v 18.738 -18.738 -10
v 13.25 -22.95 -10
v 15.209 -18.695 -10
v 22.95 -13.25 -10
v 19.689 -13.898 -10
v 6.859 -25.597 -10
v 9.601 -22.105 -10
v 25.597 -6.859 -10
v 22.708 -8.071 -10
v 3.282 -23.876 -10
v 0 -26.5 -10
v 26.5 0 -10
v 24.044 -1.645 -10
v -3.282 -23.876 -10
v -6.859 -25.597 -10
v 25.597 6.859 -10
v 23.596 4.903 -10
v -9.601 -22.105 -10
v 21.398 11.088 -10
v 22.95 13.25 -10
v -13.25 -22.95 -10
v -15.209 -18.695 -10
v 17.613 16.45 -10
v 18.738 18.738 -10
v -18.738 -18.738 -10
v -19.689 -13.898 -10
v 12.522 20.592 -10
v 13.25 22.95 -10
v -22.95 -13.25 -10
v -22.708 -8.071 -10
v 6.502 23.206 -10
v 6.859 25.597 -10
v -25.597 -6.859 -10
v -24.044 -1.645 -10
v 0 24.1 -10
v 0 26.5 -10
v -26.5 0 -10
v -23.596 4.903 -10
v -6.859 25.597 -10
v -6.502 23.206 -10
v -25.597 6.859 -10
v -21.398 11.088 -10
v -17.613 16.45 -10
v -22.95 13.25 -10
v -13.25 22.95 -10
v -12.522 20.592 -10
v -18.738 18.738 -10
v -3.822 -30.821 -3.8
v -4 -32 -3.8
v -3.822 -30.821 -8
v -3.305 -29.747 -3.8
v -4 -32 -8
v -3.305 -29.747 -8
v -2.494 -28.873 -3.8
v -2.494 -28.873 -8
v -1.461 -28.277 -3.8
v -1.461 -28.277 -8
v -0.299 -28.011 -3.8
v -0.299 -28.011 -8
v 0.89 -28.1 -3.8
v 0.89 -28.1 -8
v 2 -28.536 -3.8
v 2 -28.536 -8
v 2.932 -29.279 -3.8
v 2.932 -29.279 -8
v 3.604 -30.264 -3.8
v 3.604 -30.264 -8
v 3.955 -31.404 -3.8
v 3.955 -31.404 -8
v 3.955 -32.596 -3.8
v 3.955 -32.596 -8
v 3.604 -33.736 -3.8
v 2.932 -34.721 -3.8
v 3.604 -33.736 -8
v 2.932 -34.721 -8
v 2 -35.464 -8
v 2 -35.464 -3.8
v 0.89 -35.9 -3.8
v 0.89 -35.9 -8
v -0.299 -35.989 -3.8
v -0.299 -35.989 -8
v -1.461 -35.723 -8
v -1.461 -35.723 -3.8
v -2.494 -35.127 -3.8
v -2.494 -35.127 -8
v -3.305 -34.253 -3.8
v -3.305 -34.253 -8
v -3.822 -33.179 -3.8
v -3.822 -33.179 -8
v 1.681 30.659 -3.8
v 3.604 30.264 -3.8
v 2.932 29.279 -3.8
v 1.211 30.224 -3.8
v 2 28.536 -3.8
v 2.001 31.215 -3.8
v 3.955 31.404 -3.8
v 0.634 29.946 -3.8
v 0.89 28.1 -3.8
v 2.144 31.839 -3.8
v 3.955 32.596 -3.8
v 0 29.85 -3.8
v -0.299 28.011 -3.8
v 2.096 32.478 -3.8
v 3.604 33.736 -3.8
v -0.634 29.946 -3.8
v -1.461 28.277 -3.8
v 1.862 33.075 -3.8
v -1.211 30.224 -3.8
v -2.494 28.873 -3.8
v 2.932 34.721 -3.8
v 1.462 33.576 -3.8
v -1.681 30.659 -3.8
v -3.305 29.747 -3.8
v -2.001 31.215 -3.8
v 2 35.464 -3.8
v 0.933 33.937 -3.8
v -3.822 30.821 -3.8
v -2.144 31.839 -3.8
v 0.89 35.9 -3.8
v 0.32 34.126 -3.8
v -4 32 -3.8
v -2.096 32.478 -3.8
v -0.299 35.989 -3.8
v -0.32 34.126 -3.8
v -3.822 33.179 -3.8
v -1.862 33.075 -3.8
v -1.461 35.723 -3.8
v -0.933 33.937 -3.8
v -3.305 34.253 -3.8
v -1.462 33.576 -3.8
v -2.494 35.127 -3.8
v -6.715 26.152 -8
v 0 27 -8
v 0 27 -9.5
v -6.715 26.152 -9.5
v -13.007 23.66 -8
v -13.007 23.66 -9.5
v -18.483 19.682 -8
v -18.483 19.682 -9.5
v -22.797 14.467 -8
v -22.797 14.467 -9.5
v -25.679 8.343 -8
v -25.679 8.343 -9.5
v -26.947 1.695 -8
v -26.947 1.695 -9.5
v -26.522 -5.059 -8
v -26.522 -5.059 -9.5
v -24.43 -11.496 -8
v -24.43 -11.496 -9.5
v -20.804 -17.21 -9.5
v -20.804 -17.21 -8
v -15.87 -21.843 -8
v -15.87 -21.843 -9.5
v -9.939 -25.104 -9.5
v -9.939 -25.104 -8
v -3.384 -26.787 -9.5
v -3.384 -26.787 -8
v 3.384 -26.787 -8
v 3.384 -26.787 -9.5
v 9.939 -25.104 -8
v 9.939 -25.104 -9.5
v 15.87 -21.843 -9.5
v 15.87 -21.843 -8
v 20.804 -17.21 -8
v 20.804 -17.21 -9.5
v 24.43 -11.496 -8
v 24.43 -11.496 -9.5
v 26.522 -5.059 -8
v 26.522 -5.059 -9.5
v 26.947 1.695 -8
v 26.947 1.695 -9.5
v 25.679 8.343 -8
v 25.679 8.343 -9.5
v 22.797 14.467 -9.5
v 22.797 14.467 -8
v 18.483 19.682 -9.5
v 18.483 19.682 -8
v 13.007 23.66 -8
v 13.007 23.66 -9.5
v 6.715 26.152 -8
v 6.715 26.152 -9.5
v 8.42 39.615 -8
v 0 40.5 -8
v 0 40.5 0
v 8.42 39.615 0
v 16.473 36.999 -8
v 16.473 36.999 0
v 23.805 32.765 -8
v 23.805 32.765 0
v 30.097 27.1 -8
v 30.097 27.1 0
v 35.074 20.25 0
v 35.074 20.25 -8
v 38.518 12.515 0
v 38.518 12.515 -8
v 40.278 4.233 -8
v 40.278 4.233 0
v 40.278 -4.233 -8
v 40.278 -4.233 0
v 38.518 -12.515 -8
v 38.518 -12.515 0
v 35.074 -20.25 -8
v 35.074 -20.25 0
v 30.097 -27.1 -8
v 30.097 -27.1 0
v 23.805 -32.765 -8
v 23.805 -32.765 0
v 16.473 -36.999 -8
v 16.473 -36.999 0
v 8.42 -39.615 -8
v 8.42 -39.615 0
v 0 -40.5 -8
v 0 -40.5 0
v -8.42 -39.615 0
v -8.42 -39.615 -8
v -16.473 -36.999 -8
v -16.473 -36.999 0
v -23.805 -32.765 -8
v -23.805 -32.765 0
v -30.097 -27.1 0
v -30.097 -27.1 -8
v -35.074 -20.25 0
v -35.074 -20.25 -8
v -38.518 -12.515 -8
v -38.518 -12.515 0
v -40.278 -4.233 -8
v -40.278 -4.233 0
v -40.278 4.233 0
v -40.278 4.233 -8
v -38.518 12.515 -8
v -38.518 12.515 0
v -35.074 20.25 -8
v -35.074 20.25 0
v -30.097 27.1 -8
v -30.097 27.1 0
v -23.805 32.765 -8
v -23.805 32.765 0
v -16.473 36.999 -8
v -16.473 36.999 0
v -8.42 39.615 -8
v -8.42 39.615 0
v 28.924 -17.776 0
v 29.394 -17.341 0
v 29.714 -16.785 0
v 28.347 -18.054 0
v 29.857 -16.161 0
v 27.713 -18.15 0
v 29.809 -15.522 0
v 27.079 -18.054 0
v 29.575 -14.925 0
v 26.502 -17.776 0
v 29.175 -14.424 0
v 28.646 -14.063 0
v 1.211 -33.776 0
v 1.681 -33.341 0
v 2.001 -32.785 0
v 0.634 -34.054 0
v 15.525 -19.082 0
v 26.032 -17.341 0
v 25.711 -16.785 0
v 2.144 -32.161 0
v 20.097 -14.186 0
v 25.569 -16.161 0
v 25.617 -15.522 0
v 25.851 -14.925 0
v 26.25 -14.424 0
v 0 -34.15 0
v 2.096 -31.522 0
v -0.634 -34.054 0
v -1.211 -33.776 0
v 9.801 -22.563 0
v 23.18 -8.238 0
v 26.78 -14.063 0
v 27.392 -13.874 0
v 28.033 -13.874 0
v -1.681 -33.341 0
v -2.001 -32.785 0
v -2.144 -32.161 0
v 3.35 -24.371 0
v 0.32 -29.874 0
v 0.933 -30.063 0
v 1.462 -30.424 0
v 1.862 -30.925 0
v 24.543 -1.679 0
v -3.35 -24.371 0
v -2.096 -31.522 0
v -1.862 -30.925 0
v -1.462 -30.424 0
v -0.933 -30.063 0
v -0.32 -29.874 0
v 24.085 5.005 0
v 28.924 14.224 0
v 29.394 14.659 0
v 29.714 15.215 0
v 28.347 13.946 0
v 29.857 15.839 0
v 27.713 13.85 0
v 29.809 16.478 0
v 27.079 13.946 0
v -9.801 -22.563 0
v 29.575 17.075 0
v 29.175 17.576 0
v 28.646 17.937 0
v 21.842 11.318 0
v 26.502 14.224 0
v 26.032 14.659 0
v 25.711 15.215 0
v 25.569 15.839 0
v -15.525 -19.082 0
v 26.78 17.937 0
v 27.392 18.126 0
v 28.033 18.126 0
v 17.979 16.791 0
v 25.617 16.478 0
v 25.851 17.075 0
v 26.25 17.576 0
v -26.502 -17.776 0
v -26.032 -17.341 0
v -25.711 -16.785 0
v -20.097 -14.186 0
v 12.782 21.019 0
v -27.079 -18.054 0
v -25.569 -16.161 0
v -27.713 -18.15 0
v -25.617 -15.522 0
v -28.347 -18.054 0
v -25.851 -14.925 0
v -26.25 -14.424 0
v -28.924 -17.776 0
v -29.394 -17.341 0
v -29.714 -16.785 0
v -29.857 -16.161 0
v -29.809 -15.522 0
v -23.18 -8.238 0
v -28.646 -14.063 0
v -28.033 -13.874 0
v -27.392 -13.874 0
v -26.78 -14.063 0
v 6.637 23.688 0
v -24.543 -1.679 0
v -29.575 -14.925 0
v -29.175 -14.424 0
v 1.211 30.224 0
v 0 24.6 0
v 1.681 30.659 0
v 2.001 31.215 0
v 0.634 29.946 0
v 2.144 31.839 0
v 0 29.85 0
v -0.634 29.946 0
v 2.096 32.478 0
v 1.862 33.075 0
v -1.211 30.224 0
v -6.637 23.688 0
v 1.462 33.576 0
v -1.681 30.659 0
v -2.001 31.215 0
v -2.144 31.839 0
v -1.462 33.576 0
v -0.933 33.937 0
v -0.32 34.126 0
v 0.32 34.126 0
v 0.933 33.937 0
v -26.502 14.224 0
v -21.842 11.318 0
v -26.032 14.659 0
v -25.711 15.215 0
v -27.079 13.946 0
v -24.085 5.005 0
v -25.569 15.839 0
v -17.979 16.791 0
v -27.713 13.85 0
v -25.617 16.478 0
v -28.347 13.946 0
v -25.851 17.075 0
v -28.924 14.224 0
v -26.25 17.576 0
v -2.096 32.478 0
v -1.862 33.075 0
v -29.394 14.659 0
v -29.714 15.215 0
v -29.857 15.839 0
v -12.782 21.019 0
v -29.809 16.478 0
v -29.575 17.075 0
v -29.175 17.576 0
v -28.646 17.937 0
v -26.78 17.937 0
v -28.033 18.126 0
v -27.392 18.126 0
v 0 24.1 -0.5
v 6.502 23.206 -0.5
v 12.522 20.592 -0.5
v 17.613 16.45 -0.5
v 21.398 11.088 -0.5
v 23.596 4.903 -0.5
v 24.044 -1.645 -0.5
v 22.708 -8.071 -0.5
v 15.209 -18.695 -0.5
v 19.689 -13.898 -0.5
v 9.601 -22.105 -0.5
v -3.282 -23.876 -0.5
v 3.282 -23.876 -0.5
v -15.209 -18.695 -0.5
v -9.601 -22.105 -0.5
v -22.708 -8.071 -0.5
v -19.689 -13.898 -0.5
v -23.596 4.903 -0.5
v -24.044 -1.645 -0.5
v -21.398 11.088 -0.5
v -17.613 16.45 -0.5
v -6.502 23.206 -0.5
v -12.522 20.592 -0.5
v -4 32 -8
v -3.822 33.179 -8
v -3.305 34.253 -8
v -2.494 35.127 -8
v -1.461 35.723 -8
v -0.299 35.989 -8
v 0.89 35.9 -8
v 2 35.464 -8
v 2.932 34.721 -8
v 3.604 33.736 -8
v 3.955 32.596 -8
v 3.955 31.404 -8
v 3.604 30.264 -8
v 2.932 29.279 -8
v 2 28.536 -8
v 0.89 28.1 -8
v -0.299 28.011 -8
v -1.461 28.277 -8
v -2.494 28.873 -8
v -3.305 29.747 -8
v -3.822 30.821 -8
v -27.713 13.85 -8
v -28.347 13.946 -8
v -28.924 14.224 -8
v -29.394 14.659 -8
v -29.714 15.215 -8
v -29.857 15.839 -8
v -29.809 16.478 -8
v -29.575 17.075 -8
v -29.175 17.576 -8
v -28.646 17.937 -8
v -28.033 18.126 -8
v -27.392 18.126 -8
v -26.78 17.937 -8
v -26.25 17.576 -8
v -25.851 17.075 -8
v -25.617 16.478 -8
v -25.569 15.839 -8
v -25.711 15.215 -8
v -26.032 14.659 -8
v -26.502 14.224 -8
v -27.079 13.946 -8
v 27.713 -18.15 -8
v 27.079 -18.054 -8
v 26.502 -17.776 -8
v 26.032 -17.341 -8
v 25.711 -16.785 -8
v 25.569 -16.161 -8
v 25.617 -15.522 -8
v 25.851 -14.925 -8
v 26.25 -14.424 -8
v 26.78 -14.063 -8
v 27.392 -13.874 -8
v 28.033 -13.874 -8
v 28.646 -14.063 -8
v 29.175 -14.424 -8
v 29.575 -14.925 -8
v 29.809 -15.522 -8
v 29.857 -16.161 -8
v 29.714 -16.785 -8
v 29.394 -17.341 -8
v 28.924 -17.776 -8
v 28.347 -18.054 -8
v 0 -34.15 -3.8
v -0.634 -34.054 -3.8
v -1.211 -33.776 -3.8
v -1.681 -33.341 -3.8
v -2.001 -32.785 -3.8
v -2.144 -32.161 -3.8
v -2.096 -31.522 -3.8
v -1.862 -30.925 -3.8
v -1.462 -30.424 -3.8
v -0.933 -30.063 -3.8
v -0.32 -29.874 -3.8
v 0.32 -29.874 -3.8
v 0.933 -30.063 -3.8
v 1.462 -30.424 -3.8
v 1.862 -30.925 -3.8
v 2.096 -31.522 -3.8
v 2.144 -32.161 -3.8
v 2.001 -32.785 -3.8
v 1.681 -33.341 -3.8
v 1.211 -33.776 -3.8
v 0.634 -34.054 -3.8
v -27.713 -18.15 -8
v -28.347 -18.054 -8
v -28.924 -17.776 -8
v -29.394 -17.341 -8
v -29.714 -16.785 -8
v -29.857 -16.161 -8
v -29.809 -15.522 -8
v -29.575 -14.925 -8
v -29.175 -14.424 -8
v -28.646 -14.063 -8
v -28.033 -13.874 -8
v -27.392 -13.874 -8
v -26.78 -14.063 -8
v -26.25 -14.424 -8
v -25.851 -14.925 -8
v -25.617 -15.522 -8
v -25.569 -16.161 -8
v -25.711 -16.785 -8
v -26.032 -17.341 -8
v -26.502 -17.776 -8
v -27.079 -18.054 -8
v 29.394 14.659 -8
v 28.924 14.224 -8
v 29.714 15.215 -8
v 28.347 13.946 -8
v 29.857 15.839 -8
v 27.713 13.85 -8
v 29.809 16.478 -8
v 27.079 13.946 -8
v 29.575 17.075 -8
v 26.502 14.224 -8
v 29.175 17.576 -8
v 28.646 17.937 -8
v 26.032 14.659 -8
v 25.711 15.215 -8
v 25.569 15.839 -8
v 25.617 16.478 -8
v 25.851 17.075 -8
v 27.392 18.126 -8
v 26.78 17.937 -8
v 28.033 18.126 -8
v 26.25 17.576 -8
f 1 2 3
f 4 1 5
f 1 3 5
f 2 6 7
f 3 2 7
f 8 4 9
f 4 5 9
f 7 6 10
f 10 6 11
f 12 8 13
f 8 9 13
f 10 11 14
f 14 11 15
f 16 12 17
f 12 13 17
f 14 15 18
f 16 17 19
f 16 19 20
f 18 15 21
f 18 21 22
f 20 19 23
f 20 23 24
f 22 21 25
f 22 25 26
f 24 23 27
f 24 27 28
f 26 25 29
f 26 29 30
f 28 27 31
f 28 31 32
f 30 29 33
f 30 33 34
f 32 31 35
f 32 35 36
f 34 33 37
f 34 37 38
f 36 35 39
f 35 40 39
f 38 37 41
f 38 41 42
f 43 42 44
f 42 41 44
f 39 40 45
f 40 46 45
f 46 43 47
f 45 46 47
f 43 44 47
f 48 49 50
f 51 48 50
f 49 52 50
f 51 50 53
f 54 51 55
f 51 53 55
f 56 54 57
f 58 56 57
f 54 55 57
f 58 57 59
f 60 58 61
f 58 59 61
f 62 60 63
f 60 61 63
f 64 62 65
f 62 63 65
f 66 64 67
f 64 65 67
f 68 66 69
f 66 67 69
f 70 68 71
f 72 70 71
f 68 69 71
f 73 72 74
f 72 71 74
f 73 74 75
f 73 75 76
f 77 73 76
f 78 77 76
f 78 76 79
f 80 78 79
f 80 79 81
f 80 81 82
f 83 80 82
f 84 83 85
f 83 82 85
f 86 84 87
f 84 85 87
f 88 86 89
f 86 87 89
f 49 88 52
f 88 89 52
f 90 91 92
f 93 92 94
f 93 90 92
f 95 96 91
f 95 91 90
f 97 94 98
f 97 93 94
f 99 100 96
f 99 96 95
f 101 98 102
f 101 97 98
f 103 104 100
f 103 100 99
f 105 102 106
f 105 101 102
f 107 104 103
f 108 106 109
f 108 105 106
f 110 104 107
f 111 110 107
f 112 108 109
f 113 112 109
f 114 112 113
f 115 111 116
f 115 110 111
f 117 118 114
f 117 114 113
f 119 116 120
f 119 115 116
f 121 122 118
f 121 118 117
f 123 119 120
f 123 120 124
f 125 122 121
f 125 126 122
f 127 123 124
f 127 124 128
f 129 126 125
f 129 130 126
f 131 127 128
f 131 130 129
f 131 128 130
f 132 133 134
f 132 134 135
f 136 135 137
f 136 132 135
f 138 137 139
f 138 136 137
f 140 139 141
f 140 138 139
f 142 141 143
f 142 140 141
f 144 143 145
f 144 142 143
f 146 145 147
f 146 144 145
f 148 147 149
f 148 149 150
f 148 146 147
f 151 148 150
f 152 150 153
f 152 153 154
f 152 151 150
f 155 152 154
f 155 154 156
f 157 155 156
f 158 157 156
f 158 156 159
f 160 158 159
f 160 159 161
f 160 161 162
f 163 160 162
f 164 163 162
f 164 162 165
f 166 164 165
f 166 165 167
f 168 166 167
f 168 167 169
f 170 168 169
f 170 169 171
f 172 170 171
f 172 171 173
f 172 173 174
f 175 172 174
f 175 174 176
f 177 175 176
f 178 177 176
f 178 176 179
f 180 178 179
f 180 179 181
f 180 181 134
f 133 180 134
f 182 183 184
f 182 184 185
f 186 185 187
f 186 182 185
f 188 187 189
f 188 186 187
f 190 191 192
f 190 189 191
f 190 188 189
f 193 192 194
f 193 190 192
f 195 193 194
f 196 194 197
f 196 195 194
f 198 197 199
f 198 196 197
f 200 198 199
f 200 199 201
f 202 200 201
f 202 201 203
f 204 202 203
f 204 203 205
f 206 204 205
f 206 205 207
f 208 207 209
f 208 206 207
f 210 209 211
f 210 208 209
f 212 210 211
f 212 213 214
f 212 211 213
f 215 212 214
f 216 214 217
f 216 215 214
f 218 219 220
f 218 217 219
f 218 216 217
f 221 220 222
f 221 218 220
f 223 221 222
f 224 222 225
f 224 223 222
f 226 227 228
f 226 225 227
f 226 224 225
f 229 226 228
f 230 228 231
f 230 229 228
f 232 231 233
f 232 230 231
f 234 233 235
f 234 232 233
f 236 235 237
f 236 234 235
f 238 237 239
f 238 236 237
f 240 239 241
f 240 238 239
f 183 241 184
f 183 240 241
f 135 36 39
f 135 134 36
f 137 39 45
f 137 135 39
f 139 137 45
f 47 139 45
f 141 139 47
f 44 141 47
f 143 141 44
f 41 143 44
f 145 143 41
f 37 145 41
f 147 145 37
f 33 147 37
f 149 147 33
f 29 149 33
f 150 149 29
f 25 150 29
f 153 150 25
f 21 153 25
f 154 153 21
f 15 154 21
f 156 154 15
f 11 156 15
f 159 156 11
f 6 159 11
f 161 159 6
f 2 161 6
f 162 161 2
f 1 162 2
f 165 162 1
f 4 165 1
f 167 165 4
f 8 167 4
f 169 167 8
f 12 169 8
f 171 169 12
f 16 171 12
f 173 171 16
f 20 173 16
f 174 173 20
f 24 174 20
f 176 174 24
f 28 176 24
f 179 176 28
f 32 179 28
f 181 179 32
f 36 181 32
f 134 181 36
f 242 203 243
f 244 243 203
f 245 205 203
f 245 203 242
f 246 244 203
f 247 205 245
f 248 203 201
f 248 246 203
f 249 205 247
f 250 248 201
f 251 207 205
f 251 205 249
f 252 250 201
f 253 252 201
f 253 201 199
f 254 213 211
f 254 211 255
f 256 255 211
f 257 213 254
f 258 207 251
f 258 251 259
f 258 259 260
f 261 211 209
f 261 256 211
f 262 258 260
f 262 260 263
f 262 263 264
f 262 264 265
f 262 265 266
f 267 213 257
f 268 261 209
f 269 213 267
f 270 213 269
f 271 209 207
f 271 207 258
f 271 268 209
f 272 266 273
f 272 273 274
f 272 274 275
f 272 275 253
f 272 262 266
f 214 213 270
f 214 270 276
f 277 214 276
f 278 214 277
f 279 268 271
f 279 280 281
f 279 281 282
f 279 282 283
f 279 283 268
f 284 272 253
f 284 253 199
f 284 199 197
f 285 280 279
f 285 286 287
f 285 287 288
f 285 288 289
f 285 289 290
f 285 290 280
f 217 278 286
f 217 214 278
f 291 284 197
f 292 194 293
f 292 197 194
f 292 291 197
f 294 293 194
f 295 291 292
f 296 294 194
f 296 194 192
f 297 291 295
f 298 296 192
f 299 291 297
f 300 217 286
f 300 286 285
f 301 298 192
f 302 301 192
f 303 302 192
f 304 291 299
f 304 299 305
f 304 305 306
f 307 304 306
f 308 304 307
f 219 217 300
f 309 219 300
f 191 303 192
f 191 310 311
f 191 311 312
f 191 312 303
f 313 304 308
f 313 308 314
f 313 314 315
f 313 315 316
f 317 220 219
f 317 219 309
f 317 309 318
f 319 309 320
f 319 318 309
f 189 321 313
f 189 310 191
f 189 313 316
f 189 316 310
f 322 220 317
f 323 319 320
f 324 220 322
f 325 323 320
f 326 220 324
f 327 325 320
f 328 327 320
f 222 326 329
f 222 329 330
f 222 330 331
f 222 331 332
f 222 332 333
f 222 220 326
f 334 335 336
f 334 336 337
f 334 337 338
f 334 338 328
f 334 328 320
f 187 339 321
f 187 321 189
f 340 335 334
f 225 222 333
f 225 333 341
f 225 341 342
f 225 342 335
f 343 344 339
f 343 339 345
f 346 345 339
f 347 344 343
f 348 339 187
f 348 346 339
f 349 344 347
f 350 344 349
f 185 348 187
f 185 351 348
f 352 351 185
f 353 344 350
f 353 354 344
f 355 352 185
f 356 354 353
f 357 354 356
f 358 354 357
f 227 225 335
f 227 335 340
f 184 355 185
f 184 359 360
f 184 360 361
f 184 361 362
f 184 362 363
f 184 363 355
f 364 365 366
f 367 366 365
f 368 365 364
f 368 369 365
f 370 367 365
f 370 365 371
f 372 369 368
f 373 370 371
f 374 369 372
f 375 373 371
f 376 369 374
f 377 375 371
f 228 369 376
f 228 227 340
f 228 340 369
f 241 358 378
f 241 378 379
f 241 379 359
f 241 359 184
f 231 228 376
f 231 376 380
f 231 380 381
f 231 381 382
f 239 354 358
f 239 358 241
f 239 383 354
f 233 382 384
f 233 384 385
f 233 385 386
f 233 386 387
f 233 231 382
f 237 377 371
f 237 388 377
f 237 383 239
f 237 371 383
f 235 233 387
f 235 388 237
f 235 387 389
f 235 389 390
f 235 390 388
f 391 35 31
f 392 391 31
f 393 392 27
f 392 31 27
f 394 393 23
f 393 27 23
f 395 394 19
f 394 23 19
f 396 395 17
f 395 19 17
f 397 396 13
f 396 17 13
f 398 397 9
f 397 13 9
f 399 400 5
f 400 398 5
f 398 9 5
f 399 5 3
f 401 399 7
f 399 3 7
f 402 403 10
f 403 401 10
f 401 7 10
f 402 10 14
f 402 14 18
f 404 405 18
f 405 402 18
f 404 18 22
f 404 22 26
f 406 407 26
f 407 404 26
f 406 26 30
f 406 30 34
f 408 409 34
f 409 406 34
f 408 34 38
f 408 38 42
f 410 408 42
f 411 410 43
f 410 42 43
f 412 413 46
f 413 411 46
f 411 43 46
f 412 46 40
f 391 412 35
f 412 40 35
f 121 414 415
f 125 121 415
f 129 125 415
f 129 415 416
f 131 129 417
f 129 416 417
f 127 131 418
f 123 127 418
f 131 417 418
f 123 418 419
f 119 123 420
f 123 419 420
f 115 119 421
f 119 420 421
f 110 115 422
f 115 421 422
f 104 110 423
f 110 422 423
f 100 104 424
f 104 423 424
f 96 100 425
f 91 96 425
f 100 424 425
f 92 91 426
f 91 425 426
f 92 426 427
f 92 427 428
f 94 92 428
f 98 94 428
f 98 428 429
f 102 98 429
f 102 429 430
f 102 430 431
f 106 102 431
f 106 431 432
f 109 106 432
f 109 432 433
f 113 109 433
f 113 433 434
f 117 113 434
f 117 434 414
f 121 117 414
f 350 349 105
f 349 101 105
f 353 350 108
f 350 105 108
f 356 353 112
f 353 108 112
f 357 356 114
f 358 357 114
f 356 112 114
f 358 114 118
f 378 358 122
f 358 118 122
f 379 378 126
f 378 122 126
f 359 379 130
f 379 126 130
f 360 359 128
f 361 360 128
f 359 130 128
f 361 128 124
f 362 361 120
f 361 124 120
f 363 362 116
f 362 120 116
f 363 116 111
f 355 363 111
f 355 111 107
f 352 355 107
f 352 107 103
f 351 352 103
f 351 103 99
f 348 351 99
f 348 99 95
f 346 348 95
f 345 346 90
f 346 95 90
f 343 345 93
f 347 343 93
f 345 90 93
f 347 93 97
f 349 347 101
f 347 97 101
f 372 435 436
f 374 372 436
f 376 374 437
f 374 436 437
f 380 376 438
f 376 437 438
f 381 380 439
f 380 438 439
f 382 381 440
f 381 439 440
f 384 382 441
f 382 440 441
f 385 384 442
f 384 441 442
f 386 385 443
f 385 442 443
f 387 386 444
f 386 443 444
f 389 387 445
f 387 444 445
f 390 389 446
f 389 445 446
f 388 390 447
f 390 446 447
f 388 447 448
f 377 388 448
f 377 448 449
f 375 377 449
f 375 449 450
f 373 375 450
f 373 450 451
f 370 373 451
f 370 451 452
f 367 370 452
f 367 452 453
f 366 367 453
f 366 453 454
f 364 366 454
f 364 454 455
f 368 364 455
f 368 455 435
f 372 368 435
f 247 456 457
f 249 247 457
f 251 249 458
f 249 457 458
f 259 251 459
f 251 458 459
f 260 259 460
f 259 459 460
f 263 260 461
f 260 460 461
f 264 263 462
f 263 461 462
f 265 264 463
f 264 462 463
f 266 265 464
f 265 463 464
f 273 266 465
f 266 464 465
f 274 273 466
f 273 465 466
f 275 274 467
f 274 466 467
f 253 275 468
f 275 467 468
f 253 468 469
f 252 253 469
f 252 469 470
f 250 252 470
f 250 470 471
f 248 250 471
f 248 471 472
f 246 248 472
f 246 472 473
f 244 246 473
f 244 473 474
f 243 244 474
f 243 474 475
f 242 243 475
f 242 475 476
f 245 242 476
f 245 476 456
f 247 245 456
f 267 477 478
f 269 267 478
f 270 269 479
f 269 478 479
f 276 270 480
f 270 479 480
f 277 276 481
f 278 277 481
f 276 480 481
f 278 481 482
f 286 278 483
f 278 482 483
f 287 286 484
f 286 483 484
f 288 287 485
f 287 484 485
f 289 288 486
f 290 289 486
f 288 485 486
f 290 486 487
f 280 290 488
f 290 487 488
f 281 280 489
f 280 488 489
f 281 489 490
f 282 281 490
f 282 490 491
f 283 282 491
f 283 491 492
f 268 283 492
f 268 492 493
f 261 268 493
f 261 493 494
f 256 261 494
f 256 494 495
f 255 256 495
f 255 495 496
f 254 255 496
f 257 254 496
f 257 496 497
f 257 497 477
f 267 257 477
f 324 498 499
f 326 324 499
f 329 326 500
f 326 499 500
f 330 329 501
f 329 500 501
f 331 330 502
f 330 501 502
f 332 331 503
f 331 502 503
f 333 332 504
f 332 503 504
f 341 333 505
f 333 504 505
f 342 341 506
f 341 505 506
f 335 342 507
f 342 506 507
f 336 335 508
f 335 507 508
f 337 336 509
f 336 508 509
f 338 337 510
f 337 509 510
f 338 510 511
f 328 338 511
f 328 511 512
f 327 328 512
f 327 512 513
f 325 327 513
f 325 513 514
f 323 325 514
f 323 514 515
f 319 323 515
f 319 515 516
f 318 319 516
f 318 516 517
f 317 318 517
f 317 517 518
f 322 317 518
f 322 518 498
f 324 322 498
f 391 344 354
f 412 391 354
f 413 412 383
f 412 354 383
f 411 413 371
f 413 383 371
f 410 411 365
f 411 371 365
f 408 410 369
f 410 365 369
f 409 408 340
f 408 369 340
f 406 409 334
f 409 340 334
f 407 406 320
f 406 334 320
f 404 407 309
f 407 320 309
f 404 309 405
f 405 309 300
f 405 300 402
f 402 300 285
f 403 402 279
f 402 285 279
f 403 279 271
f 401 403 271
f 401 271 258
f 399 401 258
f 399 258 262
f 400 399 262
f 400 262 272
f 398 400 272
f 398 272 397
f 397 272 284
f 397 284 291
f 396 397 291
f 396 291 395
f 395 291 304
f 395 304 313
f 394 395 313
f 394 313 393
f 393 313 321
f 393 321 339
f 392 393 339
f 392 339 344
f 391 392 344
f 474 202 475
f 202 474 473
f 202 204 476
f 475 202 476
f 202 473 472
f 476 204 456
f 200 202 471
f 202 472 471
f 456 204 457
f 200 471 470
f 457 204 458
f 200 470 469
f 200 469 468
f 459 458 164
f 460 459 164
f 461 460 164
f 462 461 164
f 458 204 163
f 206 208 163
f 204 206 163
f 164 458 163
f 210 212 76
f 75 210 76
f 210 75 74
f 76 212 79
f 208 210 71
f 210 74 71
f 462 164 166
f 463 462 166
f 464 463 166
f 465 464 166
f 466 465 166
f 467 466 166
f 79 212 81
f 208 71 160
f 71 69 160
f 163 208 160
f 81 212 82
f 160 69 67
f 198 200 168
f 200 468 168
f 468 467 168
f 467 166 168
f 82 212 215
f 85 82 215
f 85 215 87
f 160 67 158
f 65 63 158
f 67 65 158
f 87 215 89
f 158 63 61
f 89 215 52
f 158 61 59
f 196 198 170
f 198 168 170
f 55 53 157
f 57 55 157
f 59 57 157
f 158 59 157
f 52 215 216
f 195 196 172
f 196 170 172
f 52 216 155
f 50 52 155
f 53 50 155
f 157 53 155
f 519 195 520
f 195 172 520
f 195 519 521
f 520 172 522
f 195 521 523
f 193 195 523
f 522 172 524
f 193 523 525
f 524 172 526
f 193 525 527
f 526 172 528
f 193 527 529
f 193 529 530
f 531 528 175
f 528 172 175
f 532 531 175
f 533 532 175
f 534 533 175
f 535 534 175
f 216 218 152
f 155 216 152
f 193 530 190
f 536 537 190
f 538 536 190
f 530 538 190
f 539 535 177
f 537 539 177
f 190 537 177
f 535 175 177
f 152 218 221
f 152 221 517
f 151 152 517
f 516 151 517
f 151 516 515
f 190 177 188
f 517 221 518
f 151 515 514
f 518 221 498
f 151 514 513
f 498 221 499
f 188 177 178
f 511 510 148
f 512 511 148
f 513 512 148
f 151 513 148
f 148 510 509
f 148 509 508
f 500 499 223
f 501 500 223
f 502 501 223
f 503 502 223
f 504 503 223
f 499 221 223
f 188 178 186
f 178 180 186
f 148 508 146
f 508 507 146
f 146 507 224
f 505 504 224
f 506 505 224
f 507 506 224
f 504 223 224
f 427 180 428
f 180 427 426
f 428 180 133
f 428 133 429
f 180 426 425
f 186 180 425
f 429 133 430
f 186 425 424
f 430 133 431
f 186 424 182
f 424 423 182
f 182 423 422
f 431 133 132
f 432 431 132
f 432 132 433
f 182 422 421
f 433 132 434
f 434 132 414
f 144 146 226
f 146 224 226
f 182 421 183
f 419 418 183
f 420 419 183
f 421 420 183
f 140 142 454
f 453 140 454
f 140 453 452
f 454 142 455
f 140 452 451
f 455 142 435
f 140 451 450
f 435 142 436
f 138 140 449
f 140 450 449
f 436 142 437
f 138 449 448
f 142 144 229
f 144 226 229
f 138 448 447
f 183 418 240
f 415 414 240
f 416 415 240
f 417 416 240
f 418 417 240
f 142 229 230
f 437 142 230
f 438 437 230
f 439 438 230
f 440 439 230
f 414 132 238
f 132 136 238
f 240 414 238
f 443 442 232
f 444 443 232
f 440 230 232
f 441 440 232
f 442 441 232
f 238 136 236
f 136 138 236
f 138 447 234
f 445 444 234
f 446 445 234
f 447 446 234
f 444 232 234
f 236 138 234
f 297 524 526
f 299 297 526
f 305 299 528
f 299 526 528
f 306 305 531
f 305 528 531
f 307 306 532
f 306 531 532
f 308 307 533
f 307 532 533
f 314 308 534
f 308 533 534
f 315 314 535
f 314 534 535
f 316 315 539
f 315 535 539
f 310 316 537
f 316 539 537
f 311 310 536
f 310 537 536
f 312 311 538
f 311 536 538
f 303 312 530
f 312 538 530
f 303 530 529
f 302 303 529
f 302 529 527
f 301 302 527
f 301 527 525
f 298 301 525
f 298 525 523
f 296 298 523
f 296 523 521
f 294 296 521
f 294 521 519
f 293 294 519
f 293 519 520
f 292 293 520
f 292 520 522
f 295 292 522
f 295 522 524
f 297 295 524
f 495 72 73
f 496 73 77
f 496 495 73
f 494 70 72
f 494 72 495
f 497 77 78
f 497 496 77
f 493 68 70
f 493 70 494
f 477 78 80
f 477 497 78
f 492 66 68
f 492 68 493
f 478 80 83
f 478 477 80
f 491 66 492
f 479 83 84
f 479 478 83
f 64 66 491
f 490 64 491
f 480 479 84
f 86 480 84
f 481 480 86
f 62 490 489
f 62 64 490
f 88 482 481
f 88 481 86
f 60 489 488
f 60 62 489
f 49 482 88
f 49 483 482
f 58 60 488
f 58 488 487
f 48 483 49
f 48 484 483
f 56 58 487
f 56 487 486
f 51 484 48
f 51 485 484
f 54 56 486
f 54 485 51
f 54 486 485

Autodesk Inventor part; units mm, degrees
ref_plane "YZ Plane" through (0, 0, 0) normal (1, 0, 0) x (0, 1, 0)
ref_plane "XZ Plane" through (0, 0, 0) normal (0, 1, 0) x (-1, 0, 0)
ref_plane "XY Plane" through (0, 0, 0) normal (0, 0, 1) x (1, 0, 0)
sketch "スケッチ2" plane through (0, 0, 0) normal (1, 0, 0) x (0, 1, 0)
  line L0 (24.1, 0) -> (24.1, -10)
  line L1 (40.5, 0) -> (40.5, -8)
  line L2 (40.5, 0) -> (24.1, 0)
  line L3 (24.1, 0) -> (59, 0)
  line L4 (24.1, -10) -> (27, -10)
  line L5 (0, -12) -> (0, 2) projected
  line L6 (27, -10) -> (27, -8)
  line L7 (27, -8) -> (40.5, -8)
  point P0 (0, 0)
  dimension "d40" = 24.1
  dimension "d41" = 8
  dimension "d42" = 40.5
  dimension "d43" = 27
  dimension "d44" = 2
revolve "回転1" add sketch "スケッチ2" angle 360 about axis through (0, 0, -10) along (0, 0, 1)
sketch "スケッチ4" plane through (0, 0, 0) normal (0, 0, 1) x (1, 0, 0)
  point P0 (0, 0)
  point P1 (0, 32)
  point P2 (-27.7128, 16)
  point P3 (-27.7128, -16)
  point P4 (0, -32)
  point P5 (27.7128, -16)
  point P6 (27.7128, 16)
  dimension "d11" = 32
  dimension "d14" = 360
hole "穴1" at (0, 32, 0) at (-27.7128, 16, 0) at (-27.7128, -16, 0) at (0, -32, 0) at (27.7128, -16, 0) at (27.7128, 16, 0) direction (0, 0, -1) diameter 4.3 end through all clearance for "Socket Head Cap Screw" size "M4" standard "Ansi Metric M Profile"
chamfer "面取り3" distance 0.5 angle 45 1 edges at (0, -27, -10)
chamfer "面取り4" distance 0.5 angle 45 1 edges at (0, -24.1, 0)
sketch "スケッチ9" plane through (0, 0, -8) normal (0, 0, -1) x (-1, 0, 0)
  circle A0 centre (0, -32) radius 2.15 projected
  circle A1 centre (0, 32) radius 2.15 projected
  circle A2 centre (0, -32) radius 2.15 projected
  circle A3 centre (0, -32) radius 4
  circle A4 centre (0, 32) radius 4
  point P0 (0, 0)
  dimension "d64" = 8
  dimension "d65" = 8
extrude "押し出し5" cut sketch "スケッチ9" against normal blind 4.2 contours A0 | A1 | A3 | A4
properties part number "scara-base1" material "ABS プラスチック"
